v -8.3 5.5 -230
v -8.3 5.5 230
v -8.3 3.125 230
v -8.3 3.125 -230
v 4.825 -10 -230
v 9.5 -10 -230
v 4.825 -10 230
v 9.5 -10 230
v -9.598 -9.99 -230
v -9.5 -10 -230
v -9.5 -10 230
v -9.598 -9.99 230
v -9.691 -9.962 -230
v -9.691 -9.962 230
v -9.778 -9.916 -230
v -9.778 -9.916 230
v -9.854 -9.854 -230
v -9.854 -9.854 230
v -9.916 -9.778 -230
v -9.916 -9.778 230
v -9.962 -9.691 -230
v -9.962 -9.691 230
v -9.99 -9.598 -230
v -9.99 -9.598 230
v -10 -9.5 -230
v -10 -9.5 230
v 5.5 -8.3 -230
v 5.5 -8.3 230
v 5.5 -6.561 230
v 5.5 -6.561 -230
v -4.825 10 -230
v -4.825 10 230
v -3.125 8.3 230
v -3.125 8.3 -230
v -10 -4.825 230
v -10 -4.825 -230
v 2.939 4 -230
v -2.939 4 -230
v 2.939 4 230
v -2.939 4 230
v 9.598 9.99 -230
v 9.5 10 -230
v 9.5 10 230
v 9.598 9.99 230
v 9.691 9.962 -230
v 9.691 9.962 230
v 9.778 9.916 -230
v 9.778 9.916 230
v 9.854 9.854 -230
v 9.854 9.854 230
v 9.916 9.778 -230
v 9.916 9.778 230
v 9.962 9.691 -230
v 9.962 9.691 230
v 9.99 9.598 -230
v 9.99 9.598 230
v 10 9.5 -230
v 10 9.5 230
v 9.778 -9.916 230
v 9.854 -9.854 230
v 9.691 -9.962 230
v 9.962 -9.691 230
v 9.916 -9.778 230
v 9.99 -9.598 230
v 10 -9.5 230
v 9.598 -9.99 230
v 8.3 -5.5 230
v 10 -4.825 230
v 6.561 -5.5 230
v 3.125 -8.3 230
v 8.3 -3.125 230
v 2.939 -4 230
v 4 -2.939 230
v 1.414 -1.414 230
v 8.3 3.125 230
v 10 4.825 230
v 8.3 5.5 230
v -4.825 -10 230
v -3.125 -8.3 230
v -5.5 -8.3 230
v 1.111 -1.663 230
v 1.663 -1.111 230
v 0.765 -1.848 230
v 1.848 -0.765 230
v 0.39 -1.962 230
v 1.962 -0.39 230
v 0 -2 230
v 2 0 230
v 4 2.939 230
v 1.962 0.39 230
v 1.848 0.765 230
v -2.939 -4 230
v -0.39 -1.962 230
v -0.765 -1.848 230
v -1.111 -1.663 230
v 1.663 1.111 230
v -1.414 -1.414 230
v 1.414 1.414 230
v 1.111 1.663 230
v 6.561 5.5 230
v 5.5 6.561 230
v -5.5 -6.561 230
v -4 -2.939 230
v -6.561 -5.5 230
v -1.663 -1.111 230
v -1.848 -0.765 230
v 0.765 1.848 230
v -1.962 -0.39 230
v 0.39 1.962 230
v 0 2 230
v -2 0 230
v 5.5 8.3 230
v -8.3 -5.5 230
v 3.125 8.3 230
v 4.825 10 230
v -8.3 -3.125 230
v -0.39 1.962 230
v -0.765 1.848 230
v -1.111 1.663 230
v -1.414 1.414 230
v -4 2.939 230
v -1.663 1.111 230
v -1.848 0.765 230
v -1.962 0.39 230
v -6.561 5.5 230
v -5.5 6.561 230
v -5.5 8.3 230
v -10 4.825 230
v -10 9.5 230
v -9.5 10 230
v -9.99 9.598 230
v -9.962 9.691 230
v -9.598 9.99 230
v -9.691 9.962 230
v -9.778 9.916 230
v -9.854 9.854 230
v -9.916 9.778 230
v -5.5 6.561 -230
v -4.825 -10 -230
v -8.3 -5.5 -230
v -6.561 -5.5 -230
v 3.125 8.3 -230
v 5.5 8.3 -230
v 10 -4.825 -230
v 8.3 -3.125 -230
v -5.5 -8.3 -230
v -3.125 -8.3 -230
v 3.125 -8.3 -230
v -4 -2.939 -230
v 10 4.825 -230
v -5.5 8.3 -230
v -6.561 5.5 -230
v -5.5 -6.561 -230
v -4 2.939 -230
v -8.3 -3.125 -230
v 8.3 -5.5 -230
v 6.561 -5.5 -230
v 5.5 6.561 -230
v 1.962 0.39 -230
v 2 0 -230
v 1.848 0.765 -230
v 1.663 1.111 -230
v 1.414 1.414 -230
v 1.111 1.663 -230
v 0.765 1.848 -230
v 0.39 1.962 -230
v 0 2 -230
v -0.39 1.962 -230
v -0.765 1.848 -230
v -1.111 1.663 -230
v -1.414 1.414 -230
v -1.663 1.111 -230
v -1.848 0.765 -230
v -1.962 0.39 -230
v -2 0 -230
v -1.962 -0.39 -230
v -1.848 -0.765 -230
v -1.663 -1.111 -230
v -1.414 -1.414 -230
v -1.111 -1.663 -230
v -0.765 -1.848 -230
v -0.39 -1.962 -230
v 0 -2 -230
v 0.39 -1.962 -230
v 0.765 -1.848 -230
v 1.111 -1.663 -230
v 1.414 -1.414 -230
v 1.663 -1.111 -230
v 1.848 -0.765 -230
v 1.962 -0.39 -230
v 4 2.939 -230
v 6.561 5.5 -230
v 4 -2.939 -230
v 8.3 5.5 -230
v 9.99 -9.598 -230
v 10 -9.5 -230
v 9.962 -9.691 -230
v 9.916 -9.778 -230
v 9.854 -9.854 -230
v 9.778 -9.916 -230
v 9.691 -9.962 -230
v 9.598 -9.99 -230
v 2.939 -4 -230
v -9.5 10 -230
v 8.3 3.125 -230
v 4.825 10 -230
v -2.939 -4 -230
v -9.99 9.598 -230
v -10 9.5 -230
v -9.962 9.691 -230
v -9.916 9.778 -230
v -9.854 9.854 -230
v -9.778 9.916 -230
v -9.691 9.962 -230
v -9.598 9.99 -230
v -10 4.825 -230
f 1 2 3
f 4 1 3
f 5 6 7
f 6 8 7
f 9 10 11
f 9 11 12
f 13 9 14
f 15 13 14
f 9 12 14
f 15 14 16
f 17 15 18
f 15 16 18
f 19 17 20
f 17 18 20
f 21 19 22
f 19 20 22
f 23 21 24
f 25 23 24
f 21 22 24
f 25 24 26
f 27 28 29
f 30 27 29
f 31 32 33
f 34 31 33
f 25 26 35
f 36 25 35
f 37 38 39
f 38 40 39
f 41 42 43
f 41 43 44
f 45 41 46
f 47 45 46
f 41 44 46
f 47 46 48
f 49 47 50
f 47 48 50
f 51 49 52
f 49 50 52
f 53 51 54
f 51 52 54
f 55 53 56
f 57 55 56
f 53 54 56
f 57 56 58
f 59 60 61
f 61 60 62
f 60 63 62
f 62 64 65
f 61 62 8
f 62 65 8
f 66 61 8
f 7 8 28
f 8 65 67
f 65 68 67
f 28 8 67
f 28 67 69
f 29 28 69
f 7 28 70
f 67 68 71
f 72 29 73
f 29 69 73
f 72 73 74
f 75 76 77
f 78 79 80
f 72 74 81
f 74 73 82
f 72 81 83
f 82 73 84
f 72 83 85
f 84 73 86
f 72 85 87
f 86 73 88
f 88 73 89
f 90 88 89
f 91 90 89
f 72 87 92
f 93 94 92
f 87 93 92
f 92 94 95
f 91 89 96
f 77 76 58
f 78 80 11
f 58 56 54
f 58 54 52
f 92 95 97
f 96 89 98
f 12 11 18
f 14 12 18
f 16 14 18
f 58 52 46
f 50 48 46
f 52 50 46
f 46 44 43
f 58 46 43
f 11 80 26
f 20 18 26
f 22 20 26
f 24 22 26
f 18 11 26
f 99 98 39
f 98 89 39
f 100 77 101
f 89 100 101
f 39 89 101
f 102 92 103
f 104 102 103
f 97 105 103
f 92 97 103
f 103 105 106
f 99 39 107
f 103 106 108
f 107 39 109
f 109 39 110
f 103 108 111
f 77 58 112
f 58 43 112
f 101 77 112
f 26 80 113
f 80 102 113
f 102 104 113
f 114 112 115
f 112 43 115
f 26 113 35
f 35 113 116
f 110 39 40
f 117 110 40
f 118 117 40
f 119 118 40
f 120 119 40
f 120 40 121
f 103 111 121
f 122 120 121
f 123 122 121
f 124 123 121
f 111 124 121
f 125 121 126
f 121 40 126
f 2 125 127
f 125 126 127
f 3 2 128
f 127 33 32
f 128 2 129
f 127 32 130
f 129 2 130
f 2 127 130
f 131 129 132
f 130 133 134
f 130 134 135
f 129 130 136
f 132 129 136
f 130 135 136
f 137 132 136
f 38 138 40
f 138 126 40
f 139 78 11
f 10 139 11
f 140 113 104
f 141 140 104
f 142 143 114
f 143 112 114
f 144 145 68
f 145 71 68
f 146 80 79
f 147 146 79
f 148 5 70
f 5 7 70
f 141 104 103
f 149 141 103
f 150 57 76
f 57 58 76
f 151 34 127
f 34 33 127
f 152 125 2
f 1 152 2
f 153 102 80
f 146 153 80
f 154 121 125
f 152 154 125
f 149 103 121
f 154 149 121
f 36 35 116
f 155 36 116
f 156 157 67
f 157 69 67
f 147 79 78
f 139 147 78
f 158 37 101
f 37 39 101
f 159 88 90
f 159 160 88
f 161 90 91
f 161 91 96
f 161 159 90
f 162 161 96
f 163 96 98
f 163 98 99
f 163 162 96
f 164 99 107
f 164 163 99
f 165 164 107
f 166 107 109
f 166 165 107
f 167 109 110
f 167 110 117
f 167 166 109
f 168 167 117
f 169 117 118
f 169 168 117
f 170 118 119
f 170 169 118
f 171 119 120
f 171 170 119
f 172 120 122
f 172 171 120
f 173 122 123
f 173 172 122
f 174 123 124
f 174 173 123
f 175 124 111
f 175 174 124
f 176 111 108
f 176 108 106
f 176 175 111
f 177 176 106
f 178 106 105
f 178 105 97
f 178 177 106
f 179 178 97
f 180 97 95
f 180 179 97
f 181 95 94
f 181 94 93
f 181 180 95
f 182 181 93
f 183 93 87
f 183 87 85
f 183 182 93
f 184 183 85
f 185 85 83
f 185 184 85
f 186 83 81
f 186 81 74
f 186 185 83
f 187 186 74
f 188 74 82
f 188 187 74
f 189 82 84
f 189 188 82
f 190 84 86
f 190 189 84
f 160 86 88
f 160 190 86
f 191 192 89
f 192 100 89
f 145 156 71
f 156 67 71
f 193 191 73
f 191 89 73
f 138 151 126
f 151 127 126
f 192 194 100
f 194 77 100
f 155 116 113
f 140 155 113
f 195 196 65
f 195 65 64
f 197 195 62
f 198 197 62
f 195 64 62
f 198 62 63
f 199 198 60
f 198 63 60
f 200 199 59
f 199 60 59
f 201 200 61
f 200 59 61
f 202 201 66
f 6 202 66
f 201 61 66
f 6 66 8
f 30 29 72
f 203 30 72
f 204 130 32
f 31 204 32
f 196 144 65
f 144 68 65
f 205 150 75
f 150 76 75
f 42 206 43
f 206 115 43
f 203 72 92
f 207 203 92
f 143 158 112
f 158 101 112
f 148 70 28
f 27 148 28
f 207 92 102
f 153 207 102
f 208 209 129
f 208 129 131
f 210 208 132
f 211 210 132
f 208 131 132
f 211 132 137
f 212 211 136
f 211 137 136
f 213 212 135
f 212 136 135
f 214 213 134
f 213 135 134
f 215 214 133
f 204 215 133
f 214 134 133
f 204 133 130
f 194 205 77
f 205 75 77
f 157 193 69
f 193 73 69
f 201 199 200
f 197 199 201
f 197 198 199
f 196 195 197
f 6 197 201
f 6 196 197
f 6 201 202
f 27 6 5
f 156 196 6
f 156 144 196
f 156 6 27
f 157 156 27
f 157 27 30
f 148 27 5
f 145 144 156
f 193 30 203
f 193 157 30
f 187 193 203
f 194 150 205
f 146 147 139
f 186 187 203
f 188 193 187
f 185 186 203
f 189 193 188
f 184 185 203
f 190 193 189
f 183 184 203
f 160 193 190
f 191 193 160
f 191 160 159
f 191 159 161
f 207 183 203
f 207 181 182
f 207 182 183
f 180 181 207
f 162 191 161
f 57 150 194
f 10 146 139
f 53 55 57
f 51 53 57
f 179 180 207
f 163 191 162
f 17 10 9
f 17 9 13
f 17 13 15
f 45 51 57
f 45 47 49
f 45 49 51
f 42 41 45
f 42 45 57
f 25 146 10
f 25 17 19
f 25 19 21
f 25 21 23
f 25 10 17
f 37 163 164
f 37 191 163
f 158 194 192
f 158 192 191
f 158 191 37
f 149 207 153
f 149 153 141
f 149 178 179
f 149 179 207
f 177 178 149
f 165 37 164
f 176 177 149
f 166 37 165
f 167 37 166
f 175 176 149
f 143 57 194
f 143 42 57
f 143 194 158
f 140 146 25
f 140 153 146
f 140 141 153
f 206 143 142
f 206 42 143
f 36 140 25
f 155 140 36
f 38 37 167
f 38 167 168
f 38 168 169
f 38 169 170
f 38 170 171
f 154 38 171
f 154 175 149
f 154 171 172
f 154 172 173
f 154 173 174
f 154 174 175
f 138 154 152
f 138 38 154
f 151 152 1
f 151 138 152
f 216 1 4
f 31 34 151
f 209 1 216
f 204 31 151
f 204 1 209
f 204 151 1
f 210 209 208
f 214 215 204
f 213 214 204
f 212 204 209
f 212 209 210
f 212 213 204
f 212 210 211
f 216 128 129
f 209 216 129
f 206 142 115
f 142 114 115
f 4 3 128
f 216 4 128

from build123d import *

# Parameters (mm, degrees)
CROQUIS1_R              = 2
SALIENTE_EXTRUIR2_DEPTH = 230


with BuildPart() as part:
    # Croquis1 → Saliente-Extruir2 (new, symmetric)
    with BuildSketch(Plane.XY):
        with BuildLine():
            Line((-4.825, 10), (-3.125, 8.3))
            Line((-3.125, 8.3), (-5.5, 8.3))
            Line((-5.5, 8.3), (-5.5, 6.560660172))
            Line((-5.5, 6.560660172), (-2.939339828, 4))
            Line((-2.939339828, 4), (2.939339828, 4))
            Line((2.939339828, 4), (5.5, 6.560660172))
            Line((5.5, 6.560660172), (5.5, 8.3))
            Line((5.5, 8.3), (3.125, 8.3))
            Line((3.125, 8.3), (4.825, 10))
            Line((4.825, 10), (9.5, 10))
            ThreePointArc((9.5, 10), (9.853553391, 9.853553391), (10, 9.5))
            Line((10, 9.5), (10, 4.825))
            Line((10, 4.825), (8.3, 3.125))
            Line((8.3, 3.125), (8.3, 5.5))
            Line((8.3, 5.5), (6.560660172, 5.5))
            Line((6.560660172, 5.5), (4, 2.939339828))
            Line((4, 2.939339828), (4, -2.939339828))
            Line((4, -2.939339828), (6.560660172, -5.5))
            Line((6.560660172, -5.5), (8.3, -5.5))
            Line((8.3, -5.5), (8.3, -3.125))
            Line((8.3, -3.125), (10, -4.825))
            Line((10, -4.825), (10, -9.5))
            ThreePointArc((10, -9.5), (9.853553391, -9.853553391), (9.5, -10))
            Line((9.5, -10), (4.825, -10))
            Line((4.825, -10), (3.125, -8.3))
            Line((3.125, -8.3), (5.5, -8.3))
            Line((5.5, -8.3), (5.5, -6.560660172))
            Line((5.5, -6.560660172), (2.939339828, -4))
            Line((2.939339828, -4), (-2.939339828, -4))
            Line((-2.939339828, -4), (-5.5, -6.560660172))
            Line((-5.5, -6.560660172), (-5.5, -8.3))
            Line((-5.5, -8.3), (-3.125, -8.3))
            Line((-3.125, -8.3), (-4.825, -10))
            Line((-4.825, -10), (-9.5, -10))
            ThreePointArc((-9.5, -10), (-9.853553391, -9.853553391), (-10, -9.5))
            Line((-10, -9.5), (-10, -4.825))
            Line((-10, -4.825), (-8.3, -3.125))
            Line((-8.3, -3.125), (-8.3, -5.5))
            Line((-8.3, -5.5), (-6.560660172, -5.5))
            Line((-6.560660172, -5.5), (-4, -2.939339828))
            Line((-4, -2.939339828), (-4, 2.939339828))
            Line((-4, 2.939339828), (-6.560660172, 5.5))
            Line((-6.560660172, 5.5), (-8.3, 5.5))
            Line((-8.3, 5.5), (-8.3, 3.125))
            Line((-8.3, 3.125), (-10, 4.825))
            Line((-10, 4.825), (-10, 9.5))
            ThreePointArc((-10, 9.5), (-9.853553391, 9.853553391), (-9.5, 10))
            Line((-9.5, 10), (-4.825, 10))
        make_face()
        Circle(CROQUIS1_R, mode=Mode.SUBTRACT)
    extrude(amount=SALIENTE_EXTRUIR2_DEPTH, both=True)


solid = part.part
